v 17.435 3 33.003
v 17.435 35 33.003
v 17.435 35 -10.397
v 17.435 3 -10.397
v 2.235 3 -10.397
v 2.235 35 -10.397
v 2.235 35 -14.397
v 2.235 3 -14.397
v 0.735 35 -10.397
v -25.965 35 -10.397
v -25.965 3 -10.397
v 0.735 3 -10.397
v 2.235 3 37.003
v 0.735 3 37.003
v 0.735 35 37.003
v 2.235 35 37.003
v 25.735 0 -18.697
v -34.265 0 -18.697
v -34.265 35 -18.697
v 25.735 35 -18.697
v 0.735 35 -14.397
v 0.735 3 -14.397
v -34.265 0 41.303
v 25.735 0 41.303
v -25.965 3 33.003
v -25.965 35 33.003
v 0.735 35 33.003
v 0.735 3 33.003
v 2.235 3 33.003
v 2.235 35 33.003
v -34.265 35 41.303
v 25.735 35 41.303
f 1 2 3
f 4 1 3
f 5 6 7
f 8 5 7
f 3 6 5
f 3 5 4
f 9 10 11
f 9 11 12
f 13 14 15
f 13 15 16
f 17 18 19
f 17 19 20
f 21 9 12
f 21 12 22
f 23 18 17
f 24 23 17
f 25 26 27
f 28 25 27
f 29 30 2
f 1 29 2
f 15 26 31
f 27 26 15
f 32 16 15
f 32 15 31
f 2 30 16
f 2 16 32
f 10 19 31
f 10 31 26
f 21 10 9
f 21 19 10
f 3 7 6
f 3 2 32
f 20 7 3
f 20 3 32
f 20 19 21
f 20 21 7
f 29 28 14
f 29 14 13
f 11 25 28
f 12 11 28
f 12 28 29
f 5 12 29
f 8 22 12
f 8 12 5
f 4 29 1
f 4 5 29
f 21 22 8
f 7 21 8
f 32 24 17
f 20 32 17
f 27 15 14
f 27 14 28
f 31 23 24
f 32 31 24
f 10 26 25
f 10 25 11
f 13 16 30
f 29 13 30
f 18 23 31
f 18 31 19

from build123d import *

# Parameters (mm, degrees)
SKETCH1_W           = 60
SKETCH1_H           = 60
BOSS_EXTRUDE1_DEPTH = 35
SKETCH2_W           = 43.4
SKETCH2_H           = 43.4
CUT_EXTRUDE1_DEPTH  = 32
SKETCH3_W           = 1.5
SKETCH3_H           = 4
CUT_EXTRUDE4_DEPTH  = 32
SKETCH7_W           = 3.5
SKETCH7_H           = 3.5
CUT_EXTRUDE7_DEPTH  = 76
BOSS_EXTRUDE4_DEPTH = 8.3
BOSS_EXTRUDE6_DEPTH = 8.3


with BuildPart() as part:
    # Sketch1 → Boss-Extrude1 (new body)
    with BuildSketch(Plane(origin=(0, 0, 0), x_dir=(1, 0, 0), z_dir=(0, 1, 0))):
        with Locations((-4.265402844, -11.303317536)):
            Rectangle(SKETCH1_W, SKETCH1_H)
    extrude(amount=BOSS_EXTRUDE1_DEPTH)

    # Sketch2 → Cut-Extrude1 (cut)
    with BuildSketch(Plane(origin=(0, 35, 0), x_dir=(1, 0, 0), z_dir=(0, 1, 0))):
        with Locations((-4.265402844, -11.303317536)):
            Rectangle(SKETCH2_W, SKETCH2_H)
    extrude(amount=-CUT_EXTRUDE1_DEPTH, mode=Mode.SUBTRACT)

    # Sketch3 → Cut-Extrude4 (cut)
    with BuildSketch(Plane(origin=(0, 3, 0), x_dir=(1, 0, 0), z_dir=(0, 1, 0))):
        with Locations((1.484597156, 12.396682464)):
            Rectangle(SKETCH3_W, SKETCH3_H)
        with Locations((1.484597156, -35.003317536)):
            Rectangle(SKETCH3_W, SKETCH3_H)
    extrude(amount=CUT_EXTRUDE4_DEPTH, mode=Mode.SUBTRACT)

    # Sketch7 → Cut-Extrude7 (cut)
    with BuildSketch(Plane.ZY.offset(34.265402844)):
        with Locations((-5.246682464, 30.75)):
            Rectangle(SKETCH7_W, SKETCH7_H)
    extrude(amount=-CUT_EXTRUDE7_DEPTH, mode=Mode.SUBTRACT)

    # Sketch9 → Boss-Extrude4 (add)
    with BuildSketch(Plane.ZY.offset(34.265402844)):
        Polygon((-6.996682464, 33.397625526), (-8.197769776, 33.397625526), (-8.197769776, 28.249822975), (-2.626030544, 28.249822975), (-2.626030544, 33.397625526), align=None)
    extrude(amount=-BOSS_EXTRUDE4_DEPTH)

    # Sketch10 → Boss-Extrude6 (add)
    with BuildSketch(Plane(origin=(25.734597156, 0, 0), x_dir=(0, 0, -1), z_dir=(1, 0, 0))):
        Polygon((3.496682464, 33.424191305), (7.449063177, 33.424191305), (7.449063177, 29.024449581), (7.449063177, 28.243284465), (2.654166816, 28.243284465), (2.654166816, 33.424191305), align=None)
    extrude(amount=-BOSS_EXTRUDE6_DEPTH)


solid = part.part
